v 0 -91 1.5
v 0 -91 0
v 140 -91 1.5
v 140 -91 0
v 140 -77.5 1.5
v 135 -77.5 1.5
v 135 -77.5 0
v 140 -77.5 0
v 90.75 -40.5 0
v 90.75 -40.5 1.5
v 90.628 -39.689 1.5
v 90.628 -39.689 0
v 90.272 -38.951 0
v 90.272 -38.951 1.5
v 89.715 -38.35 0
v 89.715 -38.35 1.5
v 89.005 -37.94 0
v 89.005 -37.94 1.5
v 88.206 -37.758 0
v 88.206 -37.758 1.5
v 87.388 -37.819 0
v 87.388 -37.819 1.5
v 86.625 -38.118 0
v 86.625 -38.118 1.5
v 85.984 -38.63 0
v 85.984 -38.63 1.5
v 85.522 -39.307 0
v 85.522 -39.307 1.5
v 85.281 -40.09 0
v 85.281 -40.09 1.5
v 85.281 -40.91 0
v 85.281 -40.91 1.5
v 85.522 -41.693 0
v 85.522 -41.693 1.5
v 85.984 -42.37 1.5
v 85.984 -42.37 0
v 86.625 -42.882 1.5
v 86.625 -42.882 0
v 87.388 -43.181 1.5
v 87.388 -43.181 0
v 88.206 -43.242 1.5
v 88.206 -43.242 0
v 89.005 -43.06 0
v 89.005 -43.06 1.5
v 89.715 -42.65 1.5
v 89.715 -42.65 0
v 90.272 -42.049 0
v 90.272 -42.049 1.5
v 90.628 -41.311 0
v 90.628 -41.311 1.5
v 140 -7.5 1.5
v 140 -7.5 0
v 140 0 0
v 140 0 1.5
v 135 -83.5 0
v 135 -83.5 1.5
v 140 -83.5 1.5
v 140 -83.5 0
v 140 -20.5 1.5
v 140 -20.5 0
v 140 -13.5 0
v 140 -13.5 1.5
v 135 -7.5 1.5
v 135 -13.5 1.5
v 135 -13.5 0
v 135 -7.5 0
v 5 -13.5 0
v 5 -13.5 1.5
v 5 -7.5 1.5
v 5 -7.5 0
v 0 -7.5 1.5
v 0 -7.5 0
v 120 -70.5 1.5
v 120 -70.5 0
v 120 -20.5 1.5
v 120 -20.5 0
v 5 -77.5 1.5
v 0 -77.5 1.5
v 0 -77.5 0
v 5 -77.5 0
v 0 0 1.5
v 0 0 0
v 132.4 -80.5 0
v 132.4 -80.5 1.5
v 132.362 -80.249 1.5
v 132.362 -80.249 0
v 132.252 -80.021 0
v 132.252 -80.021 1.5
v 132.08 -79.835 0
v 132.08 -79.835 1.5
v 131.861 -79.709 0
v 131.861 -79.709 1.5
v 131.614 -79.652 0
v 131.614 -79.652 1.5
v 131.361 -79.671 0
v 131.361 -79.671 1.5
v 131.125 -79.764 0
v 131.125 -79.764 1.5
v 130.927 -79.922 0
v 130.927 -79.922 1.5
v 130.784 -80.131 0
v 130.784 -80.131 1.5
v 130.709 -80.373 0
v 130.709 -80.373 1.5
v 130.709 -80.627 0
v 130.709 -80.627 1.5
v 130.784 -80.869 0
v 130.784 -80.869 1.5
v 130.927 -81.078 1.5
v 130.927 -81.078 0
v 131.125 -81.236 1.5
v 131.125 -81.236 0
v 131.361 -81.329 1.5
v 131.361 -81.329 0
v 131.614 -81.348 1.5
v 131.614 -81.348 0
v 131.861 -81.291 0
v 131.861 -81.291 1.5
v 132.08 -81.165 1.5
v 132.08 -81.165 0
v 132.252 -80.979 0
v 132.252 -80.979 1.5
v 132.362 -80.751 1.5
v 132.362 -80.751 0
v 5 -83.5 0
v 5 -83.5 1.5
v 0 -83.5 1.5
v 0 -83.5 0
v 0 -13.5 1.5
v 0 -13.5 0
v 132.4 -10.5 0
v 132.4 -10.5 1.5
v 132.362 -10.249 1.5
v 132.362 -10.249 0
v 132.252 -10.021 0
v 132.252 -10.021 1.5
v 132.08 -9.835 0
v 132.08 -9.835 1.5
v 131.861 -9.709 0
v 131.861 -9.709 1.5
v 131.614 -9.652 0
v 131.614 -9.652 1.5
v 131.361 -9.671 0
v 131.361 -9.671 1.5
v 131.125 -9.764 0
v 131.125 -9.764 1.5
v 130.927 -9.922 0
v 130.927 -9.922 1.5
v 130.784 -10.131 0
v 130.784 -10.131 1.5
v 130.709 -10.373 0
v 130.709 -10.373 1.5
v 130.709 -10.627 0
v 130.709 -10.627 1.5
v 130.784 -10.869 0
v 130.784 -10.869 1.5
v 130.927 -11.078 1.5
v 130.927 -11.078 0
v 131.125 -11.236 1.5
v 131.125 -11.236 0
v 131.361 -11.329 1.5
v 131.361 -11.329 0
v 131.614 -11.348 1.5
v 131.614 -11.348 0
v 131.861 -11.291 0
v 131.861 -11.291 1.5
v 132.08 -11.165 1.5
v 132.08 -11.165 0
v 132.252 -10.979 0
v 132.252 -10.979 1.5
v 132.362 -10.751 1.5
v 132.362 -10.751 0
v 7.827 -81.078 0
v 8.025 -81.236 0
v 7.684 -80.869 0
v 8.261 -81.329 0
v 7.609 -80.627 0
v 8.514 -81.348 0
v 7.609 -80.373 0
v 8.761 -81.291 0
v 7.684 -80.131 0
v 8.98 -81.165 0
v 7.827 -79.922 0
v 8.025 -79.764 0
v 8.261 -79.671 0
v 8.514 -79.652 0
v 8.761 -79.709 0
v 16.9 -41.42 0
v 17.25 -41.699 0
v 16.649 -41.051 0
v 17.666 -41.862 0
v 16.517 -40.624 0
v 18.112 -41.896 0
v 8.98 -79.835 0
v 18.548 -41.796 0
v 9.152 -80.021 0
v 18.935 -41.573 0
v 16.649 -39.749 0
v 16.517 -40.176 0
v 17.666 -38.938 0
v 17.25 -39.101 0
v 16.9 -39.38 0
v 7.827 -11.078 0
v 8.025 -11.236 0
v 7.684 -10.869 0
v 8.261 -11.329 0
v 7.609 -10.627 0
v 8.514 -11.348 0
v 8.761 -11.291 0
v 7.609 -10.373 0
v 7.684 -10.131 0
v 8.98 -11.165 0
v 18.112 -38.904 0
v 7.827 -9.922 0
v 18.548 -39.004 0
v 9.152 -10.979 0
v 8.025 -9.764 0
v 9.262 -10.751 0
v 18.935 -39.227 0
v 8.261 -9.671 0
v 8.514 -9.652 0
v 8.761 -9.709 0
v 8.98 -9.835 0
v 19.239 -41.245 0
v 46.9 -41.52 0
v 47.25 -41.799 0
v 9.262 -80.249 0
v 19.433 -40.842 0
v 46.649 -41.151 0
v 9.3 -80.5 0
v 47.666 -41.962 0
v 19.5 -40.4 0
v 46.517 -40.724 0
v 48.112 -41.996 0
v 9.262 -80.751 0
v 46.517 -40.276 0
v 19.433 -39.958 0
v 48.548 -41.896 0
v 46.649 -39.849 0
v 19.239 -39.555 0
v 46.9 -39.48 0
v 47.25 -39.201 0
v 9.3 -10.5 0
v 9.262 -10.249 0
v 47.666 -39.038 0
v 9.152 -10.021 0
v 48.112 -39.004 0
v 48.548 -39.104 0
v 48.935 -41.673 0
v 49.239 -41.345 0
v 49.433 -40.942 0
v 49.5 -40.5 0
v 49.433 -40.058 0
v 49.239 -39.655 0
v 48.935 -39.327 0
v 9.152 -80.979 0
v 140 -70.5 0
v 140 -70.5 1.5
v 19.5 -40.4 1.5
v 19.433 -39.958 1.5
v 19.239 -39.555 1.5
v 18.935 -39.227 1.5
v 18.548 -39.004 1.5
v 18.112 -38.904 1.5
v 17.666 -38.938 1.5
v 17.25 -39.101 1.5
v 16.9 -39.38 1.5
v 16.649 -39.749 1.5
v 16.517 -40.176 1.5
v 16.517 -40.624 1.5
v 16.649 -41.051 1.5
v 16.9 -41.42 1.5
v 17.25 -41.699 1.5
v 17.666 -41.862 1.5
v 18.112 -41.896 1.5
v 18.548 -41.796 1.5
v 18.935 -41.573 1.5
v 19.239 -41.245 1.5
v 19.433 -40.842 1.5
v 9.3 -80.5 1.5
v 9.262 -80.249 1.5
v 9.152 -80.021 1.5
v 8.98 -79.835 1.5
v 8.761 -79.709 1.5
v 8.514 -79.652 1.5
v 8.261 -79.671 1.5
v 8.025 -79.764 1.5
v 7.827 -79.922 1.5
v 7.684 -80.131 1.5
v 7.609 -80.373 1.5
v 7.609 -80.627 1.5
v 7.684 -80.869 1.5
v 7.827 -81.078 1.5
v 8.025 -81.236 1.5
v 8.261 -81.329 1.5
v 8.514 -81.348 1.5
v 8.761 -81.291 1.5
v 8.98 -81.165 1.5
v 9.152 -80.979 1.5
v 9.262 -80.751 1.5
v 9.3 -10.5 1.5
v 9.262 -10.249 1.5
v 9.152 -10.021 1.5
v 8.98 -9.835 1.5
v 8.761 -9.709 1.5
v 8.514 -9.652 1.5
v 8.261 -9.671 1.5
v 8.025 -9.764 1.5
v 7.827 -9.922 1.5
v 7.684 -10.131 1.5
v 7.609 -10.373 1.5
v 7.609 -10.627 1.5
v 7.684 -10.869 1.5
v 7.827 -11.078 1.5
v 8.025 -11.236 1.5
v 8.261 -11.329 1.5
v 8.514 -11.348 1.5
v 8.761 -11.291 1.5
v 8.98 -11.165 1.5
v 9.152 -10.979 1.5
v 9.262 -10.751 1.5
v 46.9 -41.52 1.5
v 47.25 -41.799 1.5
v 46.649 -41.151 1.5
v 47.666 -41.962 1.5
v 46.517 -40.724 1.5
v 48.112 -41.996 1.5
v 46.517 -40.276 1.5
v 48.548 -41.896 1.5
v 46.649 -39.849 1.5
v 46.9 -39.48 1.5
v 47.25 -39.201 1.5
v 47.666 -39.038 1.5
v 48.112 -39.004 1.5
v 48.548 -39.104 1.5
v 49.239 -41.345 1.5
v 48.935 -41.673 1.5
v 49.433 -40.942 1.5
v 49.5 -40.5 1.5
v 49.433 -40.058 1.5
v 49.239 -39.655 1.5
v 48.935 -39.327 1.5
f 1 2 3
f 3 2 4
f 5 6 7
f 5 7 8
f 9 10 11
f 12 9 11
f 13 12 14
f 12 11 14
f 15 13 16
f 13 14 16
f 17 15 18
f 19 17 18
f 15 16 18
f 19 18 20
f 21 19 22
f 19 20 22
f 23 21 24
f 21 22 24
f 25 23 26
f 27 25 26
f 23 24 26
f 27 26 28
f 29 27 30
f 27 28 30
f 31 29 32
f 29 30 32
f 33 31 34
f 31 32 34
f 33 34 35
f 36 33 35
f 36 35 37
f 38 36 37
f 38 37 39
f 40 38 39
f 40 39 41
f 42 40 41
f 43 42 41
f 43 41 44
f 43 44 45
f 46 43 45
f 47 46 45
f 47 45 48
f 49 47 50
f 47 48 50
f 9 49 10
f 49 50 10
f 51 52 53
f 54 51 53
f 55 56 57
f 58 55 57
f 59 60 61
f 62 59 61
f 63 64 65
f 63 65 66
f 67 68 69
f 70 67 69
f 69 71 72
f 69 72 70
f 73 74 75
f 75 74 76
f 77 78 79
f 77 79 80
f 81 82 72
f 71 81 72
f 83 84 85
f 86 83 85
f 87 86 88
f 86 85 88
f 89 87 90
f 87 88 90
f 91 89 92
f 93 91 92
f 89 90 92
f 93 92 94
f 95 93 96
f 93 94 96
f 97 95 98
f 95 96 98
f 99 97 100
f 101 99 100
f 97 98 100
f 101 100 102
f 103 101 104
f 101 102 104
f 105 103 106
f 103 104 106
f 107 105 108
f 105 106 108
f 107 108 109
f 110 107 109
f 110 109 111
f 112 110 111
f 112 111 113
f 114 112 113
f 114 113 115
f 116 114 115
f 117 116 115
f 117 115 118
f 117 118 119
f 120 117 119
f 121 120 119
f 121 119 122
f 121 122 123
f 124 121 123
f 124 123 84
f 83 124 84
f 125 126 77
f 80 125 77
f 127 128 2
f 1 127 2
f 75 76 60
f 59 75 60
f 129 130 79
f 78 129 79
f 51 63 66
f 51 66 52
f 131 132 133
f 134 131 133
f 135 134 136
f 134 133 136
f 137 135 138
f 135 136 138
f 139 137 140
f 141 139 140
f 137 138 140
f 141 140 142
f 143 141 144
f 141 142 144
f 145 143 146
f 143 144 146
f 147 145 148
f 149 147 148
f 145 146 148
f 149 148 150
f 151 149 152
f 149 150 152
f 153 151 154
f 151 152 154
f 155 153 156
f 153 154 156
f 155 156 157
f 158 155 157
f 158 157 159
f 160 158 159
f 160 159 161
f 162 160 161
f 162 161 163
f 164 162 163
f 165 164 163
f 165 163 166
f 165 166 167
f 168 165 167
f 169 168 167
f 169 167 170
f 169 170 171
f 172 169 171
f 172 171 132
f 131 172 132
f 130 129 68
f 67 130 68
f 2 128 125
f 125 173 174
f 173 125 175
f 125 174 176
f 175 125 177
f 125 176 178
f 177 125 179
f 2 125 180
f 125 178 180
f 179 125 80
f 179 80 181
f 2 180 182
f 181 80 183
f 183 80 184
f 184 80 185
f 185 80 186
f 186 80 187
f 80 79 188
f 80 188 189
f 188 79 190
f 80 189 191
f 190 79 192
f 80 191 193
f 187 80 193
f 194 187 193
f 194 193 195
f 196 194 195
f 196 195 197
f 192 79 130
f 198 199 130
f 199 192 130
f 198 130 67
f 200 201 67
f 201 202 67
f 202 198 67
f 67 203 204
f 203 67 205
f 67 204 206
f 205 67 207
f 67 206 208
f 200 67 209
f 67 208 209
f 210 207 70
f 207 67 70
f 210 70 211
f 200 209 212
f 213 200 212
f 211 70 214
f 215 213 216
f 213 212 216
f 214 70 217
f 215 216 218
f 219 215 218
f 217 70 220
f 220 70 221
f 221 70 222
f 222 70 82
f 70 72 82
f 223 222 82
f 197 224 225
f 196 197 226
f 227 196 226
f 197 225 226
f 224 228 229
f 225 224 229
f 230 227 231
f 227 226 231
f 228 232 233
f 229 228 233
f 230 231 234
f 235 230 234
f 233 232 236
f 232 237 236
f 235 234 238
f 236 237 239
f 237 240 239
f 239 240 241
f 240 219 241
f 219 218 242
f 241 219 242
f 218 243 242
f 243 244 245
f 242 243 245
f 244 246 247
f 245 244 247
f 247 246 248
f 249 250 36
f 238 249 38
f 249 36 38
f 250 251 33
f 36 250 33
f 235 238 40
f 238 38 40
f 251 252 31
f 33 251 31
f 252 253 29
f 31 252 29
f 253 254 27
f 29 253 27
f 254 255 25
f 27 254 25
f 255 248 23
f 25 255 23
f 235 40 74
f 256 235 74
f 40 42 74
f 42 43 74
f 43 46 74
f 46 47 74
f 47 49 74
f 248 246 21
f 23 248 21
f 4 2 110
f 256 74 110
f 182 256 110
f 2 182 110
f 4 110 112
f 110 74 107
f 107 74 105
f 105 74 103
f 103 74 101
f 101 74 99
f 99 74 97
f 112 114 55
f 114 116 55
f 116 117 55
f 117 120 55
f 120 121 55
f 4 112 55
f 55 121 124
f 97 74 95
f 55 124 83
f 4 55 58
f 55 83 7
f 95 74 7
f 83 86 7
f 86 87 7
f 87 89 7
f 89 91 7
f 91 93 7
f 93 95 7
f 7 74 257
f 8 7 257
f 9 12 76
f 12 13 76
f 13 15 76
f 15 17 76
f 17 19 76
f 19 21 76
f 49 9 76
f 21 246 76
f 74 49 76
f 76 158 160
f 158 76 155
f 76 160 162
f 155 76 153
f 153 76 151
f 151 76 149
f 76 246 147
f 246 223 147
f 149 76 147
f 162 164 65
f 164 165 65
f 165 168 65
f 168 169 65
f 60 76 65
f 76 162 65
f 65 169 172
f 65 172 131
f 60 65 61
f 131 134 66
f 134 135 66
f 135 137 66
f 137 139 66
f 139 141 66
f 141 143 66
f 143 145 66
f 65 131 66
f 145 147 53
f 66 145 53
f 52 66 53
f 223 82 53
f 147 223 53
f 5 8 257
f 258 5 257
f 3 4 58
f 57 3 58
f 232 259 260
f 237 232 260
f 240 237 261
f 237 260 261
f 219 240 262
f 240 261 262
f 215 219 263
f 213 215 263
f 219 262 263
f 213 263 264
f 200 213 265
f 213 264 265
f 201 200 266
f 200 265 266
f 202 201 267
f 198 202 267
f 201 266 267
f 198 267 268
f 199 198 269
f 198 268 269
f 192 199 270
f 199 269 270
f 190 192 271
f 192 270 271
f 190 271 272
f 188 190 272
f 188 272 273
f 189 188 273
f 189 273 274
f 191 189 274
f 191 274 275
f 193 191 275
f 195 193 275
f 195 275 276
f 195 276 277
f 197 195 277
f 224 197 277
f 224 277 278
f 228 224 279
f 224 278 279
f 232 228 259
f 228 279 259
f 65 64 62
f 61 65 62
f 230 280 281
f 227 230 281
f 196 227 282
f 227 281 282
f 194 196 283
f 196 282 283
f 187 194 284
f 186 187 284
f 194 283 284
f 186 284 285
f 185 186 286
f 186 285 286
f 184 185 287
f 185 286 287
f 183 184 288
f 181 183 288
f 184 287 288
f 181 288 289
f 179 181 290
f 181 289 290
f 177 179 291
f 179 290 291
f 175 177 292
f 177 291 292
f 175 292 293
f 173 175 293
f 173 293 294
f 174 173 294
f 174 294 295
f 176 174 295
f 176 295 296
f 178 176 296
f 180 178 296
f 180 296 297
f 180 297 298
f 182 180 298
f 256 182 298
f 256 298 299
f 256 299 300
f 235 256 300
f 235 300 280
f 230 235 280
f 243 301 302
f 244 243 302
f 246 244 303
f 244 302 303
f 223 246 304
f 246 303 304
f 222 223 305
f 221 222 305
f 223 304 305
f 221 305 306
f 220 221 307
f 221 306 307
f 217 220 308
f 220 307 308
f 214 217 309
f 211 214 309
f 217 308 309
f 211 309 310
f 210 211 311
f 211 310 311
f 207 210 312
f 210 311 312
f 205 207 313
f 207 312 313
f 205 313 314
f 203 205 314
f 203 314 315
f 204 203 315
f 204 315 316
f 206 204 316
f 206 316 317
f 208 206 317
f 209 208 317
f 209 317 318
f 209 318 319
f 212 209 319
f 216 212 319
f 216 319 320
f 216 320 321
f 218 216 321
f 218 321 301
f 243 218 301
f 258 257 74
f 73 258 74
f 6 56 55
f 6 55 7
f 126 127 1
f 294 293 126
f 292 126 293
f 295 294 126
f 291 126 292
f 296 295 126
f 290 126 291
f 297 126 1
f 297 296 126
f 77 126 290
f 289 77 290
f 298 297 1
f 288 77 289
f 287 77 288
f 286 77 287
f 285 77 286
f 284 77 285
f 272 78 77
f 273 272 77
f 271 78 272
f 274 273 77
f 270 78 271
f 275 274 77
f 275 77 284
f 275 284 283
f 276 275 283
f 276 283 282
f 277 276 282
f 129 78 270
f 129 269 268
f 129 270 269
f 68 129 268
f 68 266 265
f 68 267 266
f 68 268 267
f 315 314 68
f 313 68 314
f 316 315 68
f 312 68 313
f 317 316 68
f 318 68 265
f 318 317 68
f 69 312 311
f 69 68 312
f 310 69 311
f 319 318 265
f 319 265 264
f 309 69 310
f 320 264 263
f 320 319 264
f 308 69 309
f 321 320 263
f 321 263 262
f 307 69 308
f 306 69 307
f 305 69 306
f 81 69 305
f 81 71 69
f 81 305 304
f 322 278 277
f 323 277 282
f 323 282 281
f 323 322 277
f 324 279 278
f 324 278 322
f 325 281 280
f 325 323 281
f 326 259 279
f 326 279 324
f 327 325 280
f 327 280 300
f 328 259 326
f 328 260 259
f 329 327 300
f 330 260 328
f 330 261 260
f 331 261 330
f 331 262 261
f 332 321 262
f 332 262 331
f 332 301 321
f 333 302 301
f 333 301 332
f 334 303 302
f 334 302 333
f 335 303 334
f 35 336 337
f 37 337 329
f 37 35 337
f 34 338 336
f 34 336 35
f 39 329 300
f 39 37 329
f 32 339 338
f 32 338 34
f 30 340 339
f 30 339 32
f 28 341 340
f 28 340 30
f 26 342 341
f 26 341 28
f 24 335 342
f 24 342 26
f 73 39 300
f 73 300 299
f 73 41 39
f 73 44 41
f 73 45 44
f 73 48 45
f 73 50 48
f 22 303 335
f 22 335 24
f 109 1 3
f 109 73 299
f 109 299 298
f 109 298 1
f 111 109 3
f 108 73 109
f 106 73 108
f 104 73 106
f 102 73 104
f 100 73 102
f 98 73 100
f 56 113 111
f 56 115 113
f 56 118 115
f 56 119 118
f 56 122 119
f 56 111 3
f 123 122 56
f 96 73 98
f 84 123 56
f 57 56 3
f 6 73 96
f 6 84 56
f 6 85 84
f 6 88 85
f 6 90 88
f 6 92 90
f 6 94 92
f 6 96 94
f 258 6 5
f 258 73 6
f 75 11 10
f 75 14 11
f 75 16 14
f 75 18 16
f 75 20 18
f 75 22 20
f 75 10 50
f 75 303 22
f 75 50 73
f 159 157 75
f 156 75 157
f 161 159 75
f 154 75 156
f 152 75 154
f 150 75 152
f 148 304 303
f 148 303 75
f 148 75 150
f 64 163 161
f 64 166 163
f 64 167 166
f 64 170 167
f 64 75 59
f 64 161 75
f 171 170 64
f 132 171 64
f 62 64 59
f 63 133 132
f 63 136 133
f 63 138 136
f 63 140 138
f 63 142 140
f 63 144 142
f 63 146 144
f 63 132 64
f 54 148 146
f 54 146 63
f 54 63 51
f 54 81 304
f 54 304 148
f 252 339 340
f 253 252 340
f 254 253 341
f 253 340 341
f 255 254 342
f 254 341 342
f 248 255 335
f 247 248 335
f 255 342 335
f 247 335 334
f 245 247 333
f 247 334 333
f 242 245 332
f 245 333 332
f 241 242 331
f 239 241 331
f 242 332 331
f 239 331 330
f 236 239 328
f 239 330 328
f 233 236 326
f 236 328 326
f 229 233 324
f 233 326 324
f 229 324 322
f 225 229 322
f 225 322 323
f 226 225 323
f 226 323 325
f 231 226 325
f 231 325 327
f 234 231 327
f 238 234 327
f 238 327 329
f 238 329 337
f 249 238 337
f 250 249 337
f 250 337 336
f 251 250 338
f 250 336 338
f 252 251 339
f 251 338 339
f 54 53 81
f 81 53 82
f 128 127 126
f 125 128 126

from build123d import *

# Parameters (mm, degrees)
BOSS_EXTRUDE1_DEPTH = 1.5
SKETCH2_R           = 1.5
SKETCH2_R_2         = 2.75
CUT_EXTRUDE1_DEPTH  = 1.5
SKETCH5_W           = 5
SKETCH5_H           = 6
SKETCH5_R           = 0.85
CUT_EXTRUDE5_DEPTH  = 167.982783544


with BuildPart() as part:
    # Sketch1 → Boss-Extrude1 (new body)
    with BuildSketch(Plane.XY):
        Polygon((140, 0), (0, 0), (0, -91), (140, -91), (140, -70.5), (120, -70.5), (120, -20.5), (140, -20.5), align=None)
    extrude(amount=BOSS_EXTRUDE1_DEPTH)

    # Sketch2 → Cut-Extrude1 (cut)
    with BuildSketch(Plane.XY.offset(1.5)):
        with Locations((18, -40.4)):
            Circle(SKETCH2_R)
        with Locations((48, -40.5)):
            Circle(SKETCH2_R)
        with Locations((88, -40.5)):
            Circle(SKETCH2_R_2)
    extrude(amount=-CUT_EXTRUDE1_DEPTH, mode=Mode.SUBTRACT)

    # Sketch5 → Cut-Extrude5 (cut, through all)
    with BuildSketch(Plane.XY.offset(1.5)):
        with Locations((2.5, -10.5)):
            Rectangle(SKETCH5_W, SKETCH5_H)
        with Locations((2.5, -80.5)):
            Rectangle(SKETCH5_W, SKETCH5_H)
        with Locations((137.5, -80.5)):
            Rectangle(SKETCH5_W, SKETCH5_H)
        with Locations((137.5, -10.5)):
            Rectangle(SKETCH5_W, SKETCH5_H)
        with Locations((8.45, -10.5)):
            Circle(SKETCH5_R)
        with Locations((8.45, -80.5)):
            Circle(SKETCH5_R)
        with Locations((131.55, -80.5)):
            Circle(SKETCH5_R)
        with Locations((131.55, -10.5)):
            Circle(SKETCH5_R)
    extrude(amount=-CUT_EXTRUDE5_DEPTH, mode=Mode.SUBTRACT)


solid = part.part
